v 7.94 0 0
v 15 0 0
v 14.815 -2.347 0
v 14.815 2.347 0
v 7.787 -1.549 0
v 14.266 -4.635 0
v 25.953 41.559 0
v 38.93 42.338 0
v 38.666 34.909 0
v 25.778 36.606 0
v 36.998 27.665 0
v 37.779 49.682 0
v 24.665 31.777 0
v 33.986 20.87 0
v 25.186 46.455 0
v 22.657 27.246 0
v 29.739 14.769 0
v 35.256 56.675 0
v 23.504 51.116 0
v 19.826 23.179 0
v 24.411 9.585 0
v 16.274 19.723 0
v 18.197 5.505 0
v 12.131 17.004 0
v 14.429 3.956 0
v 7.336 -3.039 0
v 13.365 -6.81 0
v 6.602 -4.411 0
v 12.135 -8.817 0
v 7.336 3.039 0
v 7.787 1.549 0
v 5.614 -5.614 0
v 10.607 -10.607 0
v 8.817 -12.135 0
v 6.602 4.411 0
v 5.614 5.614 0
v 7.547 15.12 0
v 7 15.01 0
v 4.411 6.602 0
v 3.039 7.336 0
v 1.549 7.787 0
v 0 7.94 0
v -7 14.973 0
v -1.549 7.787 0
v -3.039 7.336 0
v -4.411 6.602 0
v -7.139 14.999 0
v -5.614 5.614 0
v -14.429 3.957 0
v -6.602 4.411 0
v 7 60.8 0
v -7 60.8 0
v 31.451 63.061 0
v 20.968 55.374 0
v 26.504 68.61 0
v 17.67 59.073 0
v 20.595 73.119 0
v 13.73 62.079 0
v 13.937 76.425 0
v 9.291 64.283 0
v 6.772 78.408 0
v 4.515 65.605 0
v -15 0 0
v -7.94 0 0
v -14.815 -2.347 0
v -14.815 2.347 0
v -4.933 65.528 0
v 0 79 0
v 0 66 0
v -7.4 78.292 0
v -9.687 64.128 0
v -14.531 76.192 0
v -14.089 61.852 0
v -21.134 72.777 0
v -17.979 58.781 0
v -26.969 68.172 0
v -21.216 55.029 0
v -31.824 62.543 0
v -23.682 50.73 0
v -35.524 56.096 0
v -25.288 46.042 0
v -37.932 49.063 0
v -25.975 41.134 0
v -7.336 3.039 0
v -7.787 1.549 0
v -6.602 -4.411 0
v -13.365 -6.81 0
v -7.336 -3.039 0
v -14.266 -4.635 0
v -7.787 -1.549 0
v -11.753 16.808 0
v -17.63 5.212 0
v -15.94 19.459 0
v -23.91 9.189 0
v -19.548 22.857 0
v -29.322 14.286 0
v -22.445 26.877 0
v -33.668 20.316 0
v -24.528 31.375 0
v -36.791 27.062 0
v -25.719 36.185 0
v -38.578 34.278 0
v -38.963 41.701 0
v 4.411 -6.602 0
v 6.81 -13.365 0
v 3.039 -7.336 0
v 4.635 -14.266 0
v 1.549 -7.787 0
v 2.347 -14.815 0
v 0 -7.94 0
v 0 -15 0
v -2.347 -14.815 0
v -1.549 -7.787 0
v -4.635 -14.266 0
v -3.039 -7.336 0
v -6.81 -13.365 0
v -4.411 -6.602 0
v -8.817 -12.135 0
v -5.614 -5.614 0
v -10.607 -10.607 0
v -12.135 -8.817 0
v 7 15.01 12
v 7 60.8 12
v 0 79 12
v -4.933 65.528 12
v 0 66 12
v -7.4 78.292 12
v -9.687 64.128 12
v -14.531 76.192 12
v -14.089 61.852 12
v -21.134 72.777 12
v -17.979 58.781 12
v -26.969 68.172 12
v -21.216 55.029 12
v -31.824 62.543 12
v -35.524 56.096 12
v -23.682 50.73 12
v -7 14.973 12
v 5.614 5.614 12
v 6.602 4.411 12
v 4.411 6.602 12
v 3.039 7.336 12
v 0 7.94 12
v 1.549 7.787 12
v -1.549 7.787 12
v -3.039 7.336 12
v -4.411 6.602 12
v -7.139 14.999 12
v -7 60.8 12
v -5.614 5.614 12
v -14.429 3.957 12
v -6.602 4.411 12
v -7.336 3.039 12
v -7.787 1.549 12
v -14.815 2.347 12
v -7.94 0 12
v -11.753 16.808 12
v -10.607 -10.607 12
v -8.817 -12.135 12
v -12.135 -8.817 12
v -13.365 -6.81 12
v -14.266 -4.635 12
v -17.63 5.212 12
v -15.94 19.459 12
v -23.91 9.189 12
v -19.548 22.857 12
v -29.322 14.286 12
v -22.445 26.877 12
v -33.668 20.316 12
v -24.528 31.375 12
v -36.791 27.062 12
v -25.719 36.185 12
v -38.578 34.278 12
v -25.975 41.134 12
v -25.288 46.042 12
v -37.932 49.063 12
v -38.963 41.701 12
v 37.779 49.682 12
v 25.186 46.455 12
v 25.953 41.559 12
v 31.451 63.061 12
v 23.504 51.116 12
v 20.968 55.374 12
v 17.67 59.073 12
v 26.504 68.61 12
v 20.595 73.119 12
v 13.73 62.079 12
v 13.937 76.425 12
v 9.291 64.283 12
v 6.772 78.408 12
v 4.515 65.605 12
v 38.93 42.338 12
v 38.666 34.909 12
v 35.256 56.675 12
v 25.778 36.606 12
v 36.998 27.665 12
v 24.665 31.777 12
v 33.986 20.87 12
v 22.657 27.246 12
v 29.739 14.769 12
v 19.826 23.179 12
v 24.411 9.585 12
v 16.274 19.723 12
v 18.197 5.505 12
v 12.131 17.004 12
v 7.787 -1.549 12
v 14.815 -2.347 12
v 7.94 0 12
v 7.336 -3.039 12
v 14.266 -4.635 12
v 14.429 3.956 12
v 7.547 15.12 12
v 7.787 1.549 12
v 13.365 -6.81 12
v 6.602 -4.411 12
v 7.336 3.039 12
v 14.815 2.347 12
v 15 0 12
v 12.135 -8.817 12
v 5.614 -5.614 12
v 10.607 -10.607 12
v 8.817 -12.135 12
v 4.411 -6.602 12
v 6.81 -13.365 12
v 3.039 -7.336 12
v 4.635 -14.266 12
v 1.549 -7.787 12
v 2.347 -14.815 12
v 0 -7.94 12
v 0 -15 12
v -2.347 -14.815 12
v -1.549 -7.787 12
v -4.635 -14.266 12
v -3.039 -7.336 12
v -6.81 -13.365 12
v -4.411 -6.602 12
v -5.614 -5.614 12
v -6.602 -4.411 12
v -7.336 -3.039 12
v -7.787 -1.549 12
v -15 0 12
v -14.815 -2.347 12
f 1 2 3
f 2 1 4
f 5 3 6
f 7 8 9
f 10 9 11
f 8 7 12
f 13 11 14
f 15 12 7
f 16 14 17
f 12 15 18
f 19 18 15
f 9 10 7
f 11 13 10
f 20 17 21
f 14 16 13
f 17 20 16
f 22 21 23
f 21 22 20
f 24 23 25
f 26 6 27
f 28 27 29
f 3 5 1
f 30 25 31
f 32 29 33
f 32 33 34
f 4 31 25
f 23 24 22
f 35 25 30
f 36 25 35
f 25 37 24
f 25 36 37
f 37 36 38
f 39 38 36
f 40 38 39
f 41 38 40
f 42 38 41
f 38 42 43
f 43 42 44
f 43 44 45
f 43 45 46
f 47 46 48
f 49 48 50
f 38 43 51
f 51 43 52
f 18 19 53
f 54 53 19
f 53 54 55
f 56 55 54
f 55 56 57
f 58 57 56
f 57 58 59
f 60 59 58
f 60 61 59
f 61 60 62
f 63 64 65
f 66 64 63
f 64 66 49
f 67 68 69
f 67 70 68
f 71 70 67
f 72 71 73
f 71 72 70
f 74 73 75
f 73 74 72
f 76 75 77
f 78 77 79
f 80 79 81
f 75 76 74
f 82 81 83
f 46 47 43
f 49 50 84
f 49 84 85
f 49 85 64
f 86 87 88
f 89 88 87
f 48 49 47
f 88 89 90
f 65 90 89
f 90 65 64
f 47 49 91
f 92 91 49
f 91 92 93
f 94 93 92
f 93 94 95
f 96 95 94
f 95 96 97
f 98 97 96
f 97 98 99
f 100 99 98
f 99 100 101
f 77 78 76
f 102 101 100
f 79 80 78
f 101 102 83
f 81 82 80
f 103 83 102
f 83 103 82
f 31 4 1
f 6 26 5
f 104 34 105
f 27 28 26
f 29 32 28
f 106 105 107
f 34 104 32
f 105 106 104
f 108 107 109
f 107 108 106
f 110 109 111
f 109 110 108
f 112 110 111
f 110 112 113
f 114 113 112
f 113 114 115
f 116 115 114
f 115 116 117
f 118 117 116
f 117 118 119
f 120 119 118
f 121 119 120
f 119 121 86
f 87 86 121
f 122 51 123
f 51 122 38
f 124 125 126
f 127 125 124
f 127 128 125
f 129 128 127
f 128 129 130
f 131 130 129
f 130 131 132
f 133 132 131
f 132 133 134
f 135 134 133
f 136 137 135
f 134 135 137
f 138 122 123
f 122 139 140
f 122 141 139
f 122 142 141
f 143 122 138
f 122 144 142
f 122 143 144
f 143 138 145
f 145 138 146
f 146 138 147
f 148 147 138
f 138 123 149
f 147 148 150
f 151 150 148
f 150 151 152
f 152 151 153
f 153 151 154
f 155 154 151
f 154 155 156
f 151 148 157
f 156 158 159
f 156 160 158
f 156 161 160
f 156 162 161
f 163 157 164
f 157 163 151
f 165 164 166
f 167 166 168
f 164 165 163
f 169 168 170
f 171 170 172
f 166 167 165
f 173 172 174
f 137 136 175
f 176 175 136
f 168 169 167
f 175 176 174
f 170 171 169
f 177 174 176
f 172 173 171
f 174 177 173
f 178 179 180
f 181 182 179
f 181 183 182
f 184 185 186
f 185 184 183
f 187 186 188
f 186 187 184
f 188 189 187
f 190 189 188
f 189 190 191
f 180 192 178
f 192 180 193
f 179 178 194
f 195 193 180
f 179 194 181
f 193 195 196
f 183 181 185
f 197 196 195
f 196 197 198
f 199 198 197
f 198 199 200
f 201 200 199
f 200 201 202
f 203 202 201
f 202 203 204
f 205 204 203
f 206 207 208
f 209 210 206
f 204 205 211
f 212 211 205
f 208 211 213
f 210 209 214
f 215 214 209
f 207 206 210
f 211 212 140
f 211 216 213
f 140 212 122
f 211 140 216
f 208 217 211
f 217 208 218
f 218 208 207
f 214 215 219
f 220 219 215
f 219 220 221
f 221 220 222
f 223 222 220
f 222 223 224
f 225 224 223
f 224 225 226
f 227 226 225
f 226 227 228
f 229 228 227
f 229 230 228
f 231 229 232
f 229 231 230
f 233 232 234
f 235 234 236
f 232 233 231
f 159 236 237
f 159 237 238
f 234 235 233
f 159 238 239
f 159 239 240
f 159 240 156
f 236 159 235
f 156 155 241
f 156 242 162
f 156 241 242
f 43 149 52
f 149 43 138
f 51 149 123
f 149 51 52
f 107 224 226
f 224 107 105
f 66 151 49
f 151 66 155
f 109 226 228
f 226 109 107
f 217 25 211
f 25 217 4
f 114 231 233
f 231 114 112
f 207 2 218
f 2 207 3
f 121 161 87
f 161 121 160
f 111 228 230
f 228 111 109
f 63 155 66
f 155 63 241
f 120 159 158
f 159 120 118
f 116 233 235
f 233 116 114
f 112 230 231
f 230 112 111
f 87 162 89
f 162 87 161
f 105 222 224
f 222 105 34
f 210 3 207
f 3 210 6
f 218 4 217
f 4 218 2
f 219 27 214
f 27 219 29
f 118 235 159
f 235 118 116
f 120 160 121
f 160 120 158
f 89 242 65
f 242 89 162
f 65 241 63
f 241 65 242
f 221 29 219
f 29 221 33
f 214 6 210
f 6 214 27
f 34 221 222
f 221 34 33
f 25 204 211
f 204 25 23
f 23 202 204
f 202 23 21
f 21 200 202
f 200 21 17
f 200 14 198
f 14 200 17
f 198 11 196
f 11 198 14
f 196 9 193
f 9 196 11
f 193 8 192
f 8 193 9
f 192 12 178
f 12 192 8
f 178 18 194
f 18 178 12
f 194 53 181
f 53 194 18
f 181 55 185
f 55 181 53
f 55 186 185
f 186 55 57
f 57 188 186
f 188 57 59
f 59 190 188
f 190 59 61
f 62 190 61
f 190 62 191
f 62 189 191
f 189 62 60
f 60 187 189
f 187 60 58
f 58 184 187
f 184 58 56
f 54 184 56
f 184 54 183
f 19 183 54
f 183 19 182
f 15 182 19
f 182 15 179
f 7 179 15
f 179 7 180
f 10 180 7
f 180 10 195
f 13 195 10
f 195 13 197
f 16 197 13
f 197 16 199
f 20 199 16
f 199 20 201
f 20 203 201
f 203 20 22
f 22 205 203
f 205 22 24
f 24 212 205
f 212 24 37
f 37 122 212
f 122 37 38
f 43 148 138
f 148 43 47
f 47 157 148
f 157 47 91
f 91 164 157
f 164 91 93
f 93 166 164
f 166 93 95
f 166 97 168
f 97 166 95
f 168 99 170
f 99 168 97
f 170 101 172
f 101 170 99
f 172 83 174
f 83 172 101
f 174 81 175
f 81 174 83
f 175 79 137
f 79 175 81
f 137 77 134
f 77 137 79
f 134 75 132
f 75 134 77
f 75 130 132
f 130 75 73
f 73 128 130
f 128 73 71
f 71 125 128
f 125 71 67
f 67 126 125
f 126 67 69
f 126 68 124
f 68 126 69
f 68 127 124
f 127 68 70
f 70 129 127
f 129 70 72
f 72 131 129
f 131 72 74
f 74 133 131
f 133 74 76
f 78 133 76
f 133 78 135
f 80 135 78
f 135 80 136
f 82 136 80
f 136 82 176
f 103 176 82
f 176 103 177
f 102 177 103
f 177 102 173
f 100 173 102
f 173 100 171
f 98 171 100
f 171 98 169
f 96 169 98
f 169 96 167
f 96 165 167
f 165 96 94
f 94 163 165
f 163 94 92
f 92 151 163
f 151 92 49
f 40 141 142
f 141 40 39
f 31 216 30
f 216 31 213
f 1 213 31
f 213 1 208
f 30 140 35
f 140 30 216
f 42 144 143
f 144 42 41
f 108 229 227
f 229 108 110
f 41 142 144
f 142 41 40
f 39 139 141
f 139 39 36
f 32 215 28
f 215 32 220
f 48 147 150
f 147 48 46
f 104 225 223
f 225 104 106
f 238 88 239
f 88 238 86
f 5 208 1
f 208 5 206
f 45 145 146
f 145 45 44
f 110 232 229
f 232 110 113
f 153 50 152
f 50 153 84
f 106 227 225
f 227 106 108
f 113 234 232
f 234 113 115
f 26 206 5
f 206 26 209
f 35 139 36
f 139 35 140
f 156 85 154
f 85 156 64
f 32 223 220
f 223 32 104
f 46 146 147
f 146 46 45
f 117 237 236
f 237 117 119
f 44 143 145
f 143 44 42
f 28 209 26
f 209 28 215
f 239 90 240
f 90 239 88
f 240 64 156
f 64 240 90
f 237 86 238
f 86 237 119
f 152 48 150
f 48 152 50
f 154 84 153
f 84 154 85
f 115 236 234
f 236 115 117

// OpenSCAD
$fn = 32;

// ----------------------------------------------------------------------
// Hook: 80 mm shank into a 26 mm curl, 12 mm thick
// ----------------------------------------------------------------------

// --- parameters (mm) ---
shank_len = 80;           // shank length from the boss centre
shank_w = 14;             // shank width
boss_d = 30;              // boss diameter
bore_d = 15.88;           // boss bore
curl_in = 26;             // curl inner radius
curl_out = 39;            // curl outer radius
curl_sweep = 350;         // curl sweep angle
hook_t = 12;              // hook thickness

shank_profile = [[-7, 60.8], [7, 60.8], [7, 13], [-7, 13]];
boss_profile = [[15, 0], [14.815, 2.347], [14.266, 4.635], [13.365, 6.81], [12.135, 8.817], [10.607, 10.607], [8.817, 12.135], [6.81, 13.365], [4.635, 14.266], [2.347, 14.815], [0, 15], [-2.347, 14.815], [-4.635, 14.266], [-6.81, 13.365], [-8.817, 12.135], [-10.607, 10.607], [-12.135, 8.817], [-13.365, 6.81], [-14.266, 4.635], [-14.815, 2.347], [-15, 0], [-14.815, -2.347], [-14.266, -4.635], [-13.365, -6.81], [-12.135, -8.817], [-10.607, -10.607], [-8.817, -12.135], [-6.81, -13.365], [-4.635, -14.266], [-2.347, -14.815], [0, -15], [2.347, -14.815], [4.635, -14.266], [6.81, -13.365], [8.817, -12.135], [10.607, -10.607], [12.135, -8.817], [13.365, -6.81], [14.266, -4.635], [14.815, -2.347]];
curl_profile = [[0, 79], [-7.4, 78.292], [-14.531, 76.192], [-21.134, 72.777], [-26.969, 68.172], [-31.824, 62.543], [-35.524, 56.096], [-37.932, 49.063], [-38.963, 41.701], [-38.578, 34.278], [-36.791, 27.062], [-33.668, 20.316], [-29.322, 14.286], [-23.91, 9.189], [-17.63, 5.212], [-10.709, 2.499], [-3.399, 1.148], [4.034, 1.209], [11.321, 2.679], [18.197, 5.505], [24.411, 9.585], [29.739, 14.769], [33.986, 20.87], [36.998, 27.665], [38.666, 34.909], [38.93, 42.338], [37.779, 49.682], [35.256, 56.675], [31.451, 63.061], [26.504, 68.61], [20.595, 73.119], [13.937, 76.425], [6.772, 78.408], [4.515, 65.605], [9.291, 64.283], [13.73, 62.079], [17.67, 59.073], [20.968, 55.374], [23.504, 51.116], [25.186, 46.455], [25.953, 41.559], [25.778, 36.606], [24.665, 31.777], [22.657, 27.246], [19.826, 23.179], [16.274, 19.723], [12.131, 17.004], [7.547, 15.12], [2.69, 14.139], [-2.266, 14.099], [-7.139, 14.999], [-11.753, 16.808], [-15.94, 19.459], [-19.548, 22.857], [-22.445, 26.877], [-24.528, 31.375], [-25.719, 36.185], [-25.975, 41.134], [-25.288, 46.042], [-23.682, 50.73], [-21.216, 55.029], [-17.979, 58.781], [-14.089, 61.852], [-9.687, 64.128], [-4.933, 65.528], [0, 66]];

difference() {
  union() {
    /* three overlapping outlines: shank, boss and the smooth curl */
    linear_extrude(height = hook_t) polygon(shank_profile);
    linear_extrude(height = hook_t) polygon(boss_profile);
    linear_extrude(height = hook_t) polygon(curl_profile);
  }
  translate([0, 0, -2.5]) cylinder(h = hook_t + 5, d = bore_d);
}
